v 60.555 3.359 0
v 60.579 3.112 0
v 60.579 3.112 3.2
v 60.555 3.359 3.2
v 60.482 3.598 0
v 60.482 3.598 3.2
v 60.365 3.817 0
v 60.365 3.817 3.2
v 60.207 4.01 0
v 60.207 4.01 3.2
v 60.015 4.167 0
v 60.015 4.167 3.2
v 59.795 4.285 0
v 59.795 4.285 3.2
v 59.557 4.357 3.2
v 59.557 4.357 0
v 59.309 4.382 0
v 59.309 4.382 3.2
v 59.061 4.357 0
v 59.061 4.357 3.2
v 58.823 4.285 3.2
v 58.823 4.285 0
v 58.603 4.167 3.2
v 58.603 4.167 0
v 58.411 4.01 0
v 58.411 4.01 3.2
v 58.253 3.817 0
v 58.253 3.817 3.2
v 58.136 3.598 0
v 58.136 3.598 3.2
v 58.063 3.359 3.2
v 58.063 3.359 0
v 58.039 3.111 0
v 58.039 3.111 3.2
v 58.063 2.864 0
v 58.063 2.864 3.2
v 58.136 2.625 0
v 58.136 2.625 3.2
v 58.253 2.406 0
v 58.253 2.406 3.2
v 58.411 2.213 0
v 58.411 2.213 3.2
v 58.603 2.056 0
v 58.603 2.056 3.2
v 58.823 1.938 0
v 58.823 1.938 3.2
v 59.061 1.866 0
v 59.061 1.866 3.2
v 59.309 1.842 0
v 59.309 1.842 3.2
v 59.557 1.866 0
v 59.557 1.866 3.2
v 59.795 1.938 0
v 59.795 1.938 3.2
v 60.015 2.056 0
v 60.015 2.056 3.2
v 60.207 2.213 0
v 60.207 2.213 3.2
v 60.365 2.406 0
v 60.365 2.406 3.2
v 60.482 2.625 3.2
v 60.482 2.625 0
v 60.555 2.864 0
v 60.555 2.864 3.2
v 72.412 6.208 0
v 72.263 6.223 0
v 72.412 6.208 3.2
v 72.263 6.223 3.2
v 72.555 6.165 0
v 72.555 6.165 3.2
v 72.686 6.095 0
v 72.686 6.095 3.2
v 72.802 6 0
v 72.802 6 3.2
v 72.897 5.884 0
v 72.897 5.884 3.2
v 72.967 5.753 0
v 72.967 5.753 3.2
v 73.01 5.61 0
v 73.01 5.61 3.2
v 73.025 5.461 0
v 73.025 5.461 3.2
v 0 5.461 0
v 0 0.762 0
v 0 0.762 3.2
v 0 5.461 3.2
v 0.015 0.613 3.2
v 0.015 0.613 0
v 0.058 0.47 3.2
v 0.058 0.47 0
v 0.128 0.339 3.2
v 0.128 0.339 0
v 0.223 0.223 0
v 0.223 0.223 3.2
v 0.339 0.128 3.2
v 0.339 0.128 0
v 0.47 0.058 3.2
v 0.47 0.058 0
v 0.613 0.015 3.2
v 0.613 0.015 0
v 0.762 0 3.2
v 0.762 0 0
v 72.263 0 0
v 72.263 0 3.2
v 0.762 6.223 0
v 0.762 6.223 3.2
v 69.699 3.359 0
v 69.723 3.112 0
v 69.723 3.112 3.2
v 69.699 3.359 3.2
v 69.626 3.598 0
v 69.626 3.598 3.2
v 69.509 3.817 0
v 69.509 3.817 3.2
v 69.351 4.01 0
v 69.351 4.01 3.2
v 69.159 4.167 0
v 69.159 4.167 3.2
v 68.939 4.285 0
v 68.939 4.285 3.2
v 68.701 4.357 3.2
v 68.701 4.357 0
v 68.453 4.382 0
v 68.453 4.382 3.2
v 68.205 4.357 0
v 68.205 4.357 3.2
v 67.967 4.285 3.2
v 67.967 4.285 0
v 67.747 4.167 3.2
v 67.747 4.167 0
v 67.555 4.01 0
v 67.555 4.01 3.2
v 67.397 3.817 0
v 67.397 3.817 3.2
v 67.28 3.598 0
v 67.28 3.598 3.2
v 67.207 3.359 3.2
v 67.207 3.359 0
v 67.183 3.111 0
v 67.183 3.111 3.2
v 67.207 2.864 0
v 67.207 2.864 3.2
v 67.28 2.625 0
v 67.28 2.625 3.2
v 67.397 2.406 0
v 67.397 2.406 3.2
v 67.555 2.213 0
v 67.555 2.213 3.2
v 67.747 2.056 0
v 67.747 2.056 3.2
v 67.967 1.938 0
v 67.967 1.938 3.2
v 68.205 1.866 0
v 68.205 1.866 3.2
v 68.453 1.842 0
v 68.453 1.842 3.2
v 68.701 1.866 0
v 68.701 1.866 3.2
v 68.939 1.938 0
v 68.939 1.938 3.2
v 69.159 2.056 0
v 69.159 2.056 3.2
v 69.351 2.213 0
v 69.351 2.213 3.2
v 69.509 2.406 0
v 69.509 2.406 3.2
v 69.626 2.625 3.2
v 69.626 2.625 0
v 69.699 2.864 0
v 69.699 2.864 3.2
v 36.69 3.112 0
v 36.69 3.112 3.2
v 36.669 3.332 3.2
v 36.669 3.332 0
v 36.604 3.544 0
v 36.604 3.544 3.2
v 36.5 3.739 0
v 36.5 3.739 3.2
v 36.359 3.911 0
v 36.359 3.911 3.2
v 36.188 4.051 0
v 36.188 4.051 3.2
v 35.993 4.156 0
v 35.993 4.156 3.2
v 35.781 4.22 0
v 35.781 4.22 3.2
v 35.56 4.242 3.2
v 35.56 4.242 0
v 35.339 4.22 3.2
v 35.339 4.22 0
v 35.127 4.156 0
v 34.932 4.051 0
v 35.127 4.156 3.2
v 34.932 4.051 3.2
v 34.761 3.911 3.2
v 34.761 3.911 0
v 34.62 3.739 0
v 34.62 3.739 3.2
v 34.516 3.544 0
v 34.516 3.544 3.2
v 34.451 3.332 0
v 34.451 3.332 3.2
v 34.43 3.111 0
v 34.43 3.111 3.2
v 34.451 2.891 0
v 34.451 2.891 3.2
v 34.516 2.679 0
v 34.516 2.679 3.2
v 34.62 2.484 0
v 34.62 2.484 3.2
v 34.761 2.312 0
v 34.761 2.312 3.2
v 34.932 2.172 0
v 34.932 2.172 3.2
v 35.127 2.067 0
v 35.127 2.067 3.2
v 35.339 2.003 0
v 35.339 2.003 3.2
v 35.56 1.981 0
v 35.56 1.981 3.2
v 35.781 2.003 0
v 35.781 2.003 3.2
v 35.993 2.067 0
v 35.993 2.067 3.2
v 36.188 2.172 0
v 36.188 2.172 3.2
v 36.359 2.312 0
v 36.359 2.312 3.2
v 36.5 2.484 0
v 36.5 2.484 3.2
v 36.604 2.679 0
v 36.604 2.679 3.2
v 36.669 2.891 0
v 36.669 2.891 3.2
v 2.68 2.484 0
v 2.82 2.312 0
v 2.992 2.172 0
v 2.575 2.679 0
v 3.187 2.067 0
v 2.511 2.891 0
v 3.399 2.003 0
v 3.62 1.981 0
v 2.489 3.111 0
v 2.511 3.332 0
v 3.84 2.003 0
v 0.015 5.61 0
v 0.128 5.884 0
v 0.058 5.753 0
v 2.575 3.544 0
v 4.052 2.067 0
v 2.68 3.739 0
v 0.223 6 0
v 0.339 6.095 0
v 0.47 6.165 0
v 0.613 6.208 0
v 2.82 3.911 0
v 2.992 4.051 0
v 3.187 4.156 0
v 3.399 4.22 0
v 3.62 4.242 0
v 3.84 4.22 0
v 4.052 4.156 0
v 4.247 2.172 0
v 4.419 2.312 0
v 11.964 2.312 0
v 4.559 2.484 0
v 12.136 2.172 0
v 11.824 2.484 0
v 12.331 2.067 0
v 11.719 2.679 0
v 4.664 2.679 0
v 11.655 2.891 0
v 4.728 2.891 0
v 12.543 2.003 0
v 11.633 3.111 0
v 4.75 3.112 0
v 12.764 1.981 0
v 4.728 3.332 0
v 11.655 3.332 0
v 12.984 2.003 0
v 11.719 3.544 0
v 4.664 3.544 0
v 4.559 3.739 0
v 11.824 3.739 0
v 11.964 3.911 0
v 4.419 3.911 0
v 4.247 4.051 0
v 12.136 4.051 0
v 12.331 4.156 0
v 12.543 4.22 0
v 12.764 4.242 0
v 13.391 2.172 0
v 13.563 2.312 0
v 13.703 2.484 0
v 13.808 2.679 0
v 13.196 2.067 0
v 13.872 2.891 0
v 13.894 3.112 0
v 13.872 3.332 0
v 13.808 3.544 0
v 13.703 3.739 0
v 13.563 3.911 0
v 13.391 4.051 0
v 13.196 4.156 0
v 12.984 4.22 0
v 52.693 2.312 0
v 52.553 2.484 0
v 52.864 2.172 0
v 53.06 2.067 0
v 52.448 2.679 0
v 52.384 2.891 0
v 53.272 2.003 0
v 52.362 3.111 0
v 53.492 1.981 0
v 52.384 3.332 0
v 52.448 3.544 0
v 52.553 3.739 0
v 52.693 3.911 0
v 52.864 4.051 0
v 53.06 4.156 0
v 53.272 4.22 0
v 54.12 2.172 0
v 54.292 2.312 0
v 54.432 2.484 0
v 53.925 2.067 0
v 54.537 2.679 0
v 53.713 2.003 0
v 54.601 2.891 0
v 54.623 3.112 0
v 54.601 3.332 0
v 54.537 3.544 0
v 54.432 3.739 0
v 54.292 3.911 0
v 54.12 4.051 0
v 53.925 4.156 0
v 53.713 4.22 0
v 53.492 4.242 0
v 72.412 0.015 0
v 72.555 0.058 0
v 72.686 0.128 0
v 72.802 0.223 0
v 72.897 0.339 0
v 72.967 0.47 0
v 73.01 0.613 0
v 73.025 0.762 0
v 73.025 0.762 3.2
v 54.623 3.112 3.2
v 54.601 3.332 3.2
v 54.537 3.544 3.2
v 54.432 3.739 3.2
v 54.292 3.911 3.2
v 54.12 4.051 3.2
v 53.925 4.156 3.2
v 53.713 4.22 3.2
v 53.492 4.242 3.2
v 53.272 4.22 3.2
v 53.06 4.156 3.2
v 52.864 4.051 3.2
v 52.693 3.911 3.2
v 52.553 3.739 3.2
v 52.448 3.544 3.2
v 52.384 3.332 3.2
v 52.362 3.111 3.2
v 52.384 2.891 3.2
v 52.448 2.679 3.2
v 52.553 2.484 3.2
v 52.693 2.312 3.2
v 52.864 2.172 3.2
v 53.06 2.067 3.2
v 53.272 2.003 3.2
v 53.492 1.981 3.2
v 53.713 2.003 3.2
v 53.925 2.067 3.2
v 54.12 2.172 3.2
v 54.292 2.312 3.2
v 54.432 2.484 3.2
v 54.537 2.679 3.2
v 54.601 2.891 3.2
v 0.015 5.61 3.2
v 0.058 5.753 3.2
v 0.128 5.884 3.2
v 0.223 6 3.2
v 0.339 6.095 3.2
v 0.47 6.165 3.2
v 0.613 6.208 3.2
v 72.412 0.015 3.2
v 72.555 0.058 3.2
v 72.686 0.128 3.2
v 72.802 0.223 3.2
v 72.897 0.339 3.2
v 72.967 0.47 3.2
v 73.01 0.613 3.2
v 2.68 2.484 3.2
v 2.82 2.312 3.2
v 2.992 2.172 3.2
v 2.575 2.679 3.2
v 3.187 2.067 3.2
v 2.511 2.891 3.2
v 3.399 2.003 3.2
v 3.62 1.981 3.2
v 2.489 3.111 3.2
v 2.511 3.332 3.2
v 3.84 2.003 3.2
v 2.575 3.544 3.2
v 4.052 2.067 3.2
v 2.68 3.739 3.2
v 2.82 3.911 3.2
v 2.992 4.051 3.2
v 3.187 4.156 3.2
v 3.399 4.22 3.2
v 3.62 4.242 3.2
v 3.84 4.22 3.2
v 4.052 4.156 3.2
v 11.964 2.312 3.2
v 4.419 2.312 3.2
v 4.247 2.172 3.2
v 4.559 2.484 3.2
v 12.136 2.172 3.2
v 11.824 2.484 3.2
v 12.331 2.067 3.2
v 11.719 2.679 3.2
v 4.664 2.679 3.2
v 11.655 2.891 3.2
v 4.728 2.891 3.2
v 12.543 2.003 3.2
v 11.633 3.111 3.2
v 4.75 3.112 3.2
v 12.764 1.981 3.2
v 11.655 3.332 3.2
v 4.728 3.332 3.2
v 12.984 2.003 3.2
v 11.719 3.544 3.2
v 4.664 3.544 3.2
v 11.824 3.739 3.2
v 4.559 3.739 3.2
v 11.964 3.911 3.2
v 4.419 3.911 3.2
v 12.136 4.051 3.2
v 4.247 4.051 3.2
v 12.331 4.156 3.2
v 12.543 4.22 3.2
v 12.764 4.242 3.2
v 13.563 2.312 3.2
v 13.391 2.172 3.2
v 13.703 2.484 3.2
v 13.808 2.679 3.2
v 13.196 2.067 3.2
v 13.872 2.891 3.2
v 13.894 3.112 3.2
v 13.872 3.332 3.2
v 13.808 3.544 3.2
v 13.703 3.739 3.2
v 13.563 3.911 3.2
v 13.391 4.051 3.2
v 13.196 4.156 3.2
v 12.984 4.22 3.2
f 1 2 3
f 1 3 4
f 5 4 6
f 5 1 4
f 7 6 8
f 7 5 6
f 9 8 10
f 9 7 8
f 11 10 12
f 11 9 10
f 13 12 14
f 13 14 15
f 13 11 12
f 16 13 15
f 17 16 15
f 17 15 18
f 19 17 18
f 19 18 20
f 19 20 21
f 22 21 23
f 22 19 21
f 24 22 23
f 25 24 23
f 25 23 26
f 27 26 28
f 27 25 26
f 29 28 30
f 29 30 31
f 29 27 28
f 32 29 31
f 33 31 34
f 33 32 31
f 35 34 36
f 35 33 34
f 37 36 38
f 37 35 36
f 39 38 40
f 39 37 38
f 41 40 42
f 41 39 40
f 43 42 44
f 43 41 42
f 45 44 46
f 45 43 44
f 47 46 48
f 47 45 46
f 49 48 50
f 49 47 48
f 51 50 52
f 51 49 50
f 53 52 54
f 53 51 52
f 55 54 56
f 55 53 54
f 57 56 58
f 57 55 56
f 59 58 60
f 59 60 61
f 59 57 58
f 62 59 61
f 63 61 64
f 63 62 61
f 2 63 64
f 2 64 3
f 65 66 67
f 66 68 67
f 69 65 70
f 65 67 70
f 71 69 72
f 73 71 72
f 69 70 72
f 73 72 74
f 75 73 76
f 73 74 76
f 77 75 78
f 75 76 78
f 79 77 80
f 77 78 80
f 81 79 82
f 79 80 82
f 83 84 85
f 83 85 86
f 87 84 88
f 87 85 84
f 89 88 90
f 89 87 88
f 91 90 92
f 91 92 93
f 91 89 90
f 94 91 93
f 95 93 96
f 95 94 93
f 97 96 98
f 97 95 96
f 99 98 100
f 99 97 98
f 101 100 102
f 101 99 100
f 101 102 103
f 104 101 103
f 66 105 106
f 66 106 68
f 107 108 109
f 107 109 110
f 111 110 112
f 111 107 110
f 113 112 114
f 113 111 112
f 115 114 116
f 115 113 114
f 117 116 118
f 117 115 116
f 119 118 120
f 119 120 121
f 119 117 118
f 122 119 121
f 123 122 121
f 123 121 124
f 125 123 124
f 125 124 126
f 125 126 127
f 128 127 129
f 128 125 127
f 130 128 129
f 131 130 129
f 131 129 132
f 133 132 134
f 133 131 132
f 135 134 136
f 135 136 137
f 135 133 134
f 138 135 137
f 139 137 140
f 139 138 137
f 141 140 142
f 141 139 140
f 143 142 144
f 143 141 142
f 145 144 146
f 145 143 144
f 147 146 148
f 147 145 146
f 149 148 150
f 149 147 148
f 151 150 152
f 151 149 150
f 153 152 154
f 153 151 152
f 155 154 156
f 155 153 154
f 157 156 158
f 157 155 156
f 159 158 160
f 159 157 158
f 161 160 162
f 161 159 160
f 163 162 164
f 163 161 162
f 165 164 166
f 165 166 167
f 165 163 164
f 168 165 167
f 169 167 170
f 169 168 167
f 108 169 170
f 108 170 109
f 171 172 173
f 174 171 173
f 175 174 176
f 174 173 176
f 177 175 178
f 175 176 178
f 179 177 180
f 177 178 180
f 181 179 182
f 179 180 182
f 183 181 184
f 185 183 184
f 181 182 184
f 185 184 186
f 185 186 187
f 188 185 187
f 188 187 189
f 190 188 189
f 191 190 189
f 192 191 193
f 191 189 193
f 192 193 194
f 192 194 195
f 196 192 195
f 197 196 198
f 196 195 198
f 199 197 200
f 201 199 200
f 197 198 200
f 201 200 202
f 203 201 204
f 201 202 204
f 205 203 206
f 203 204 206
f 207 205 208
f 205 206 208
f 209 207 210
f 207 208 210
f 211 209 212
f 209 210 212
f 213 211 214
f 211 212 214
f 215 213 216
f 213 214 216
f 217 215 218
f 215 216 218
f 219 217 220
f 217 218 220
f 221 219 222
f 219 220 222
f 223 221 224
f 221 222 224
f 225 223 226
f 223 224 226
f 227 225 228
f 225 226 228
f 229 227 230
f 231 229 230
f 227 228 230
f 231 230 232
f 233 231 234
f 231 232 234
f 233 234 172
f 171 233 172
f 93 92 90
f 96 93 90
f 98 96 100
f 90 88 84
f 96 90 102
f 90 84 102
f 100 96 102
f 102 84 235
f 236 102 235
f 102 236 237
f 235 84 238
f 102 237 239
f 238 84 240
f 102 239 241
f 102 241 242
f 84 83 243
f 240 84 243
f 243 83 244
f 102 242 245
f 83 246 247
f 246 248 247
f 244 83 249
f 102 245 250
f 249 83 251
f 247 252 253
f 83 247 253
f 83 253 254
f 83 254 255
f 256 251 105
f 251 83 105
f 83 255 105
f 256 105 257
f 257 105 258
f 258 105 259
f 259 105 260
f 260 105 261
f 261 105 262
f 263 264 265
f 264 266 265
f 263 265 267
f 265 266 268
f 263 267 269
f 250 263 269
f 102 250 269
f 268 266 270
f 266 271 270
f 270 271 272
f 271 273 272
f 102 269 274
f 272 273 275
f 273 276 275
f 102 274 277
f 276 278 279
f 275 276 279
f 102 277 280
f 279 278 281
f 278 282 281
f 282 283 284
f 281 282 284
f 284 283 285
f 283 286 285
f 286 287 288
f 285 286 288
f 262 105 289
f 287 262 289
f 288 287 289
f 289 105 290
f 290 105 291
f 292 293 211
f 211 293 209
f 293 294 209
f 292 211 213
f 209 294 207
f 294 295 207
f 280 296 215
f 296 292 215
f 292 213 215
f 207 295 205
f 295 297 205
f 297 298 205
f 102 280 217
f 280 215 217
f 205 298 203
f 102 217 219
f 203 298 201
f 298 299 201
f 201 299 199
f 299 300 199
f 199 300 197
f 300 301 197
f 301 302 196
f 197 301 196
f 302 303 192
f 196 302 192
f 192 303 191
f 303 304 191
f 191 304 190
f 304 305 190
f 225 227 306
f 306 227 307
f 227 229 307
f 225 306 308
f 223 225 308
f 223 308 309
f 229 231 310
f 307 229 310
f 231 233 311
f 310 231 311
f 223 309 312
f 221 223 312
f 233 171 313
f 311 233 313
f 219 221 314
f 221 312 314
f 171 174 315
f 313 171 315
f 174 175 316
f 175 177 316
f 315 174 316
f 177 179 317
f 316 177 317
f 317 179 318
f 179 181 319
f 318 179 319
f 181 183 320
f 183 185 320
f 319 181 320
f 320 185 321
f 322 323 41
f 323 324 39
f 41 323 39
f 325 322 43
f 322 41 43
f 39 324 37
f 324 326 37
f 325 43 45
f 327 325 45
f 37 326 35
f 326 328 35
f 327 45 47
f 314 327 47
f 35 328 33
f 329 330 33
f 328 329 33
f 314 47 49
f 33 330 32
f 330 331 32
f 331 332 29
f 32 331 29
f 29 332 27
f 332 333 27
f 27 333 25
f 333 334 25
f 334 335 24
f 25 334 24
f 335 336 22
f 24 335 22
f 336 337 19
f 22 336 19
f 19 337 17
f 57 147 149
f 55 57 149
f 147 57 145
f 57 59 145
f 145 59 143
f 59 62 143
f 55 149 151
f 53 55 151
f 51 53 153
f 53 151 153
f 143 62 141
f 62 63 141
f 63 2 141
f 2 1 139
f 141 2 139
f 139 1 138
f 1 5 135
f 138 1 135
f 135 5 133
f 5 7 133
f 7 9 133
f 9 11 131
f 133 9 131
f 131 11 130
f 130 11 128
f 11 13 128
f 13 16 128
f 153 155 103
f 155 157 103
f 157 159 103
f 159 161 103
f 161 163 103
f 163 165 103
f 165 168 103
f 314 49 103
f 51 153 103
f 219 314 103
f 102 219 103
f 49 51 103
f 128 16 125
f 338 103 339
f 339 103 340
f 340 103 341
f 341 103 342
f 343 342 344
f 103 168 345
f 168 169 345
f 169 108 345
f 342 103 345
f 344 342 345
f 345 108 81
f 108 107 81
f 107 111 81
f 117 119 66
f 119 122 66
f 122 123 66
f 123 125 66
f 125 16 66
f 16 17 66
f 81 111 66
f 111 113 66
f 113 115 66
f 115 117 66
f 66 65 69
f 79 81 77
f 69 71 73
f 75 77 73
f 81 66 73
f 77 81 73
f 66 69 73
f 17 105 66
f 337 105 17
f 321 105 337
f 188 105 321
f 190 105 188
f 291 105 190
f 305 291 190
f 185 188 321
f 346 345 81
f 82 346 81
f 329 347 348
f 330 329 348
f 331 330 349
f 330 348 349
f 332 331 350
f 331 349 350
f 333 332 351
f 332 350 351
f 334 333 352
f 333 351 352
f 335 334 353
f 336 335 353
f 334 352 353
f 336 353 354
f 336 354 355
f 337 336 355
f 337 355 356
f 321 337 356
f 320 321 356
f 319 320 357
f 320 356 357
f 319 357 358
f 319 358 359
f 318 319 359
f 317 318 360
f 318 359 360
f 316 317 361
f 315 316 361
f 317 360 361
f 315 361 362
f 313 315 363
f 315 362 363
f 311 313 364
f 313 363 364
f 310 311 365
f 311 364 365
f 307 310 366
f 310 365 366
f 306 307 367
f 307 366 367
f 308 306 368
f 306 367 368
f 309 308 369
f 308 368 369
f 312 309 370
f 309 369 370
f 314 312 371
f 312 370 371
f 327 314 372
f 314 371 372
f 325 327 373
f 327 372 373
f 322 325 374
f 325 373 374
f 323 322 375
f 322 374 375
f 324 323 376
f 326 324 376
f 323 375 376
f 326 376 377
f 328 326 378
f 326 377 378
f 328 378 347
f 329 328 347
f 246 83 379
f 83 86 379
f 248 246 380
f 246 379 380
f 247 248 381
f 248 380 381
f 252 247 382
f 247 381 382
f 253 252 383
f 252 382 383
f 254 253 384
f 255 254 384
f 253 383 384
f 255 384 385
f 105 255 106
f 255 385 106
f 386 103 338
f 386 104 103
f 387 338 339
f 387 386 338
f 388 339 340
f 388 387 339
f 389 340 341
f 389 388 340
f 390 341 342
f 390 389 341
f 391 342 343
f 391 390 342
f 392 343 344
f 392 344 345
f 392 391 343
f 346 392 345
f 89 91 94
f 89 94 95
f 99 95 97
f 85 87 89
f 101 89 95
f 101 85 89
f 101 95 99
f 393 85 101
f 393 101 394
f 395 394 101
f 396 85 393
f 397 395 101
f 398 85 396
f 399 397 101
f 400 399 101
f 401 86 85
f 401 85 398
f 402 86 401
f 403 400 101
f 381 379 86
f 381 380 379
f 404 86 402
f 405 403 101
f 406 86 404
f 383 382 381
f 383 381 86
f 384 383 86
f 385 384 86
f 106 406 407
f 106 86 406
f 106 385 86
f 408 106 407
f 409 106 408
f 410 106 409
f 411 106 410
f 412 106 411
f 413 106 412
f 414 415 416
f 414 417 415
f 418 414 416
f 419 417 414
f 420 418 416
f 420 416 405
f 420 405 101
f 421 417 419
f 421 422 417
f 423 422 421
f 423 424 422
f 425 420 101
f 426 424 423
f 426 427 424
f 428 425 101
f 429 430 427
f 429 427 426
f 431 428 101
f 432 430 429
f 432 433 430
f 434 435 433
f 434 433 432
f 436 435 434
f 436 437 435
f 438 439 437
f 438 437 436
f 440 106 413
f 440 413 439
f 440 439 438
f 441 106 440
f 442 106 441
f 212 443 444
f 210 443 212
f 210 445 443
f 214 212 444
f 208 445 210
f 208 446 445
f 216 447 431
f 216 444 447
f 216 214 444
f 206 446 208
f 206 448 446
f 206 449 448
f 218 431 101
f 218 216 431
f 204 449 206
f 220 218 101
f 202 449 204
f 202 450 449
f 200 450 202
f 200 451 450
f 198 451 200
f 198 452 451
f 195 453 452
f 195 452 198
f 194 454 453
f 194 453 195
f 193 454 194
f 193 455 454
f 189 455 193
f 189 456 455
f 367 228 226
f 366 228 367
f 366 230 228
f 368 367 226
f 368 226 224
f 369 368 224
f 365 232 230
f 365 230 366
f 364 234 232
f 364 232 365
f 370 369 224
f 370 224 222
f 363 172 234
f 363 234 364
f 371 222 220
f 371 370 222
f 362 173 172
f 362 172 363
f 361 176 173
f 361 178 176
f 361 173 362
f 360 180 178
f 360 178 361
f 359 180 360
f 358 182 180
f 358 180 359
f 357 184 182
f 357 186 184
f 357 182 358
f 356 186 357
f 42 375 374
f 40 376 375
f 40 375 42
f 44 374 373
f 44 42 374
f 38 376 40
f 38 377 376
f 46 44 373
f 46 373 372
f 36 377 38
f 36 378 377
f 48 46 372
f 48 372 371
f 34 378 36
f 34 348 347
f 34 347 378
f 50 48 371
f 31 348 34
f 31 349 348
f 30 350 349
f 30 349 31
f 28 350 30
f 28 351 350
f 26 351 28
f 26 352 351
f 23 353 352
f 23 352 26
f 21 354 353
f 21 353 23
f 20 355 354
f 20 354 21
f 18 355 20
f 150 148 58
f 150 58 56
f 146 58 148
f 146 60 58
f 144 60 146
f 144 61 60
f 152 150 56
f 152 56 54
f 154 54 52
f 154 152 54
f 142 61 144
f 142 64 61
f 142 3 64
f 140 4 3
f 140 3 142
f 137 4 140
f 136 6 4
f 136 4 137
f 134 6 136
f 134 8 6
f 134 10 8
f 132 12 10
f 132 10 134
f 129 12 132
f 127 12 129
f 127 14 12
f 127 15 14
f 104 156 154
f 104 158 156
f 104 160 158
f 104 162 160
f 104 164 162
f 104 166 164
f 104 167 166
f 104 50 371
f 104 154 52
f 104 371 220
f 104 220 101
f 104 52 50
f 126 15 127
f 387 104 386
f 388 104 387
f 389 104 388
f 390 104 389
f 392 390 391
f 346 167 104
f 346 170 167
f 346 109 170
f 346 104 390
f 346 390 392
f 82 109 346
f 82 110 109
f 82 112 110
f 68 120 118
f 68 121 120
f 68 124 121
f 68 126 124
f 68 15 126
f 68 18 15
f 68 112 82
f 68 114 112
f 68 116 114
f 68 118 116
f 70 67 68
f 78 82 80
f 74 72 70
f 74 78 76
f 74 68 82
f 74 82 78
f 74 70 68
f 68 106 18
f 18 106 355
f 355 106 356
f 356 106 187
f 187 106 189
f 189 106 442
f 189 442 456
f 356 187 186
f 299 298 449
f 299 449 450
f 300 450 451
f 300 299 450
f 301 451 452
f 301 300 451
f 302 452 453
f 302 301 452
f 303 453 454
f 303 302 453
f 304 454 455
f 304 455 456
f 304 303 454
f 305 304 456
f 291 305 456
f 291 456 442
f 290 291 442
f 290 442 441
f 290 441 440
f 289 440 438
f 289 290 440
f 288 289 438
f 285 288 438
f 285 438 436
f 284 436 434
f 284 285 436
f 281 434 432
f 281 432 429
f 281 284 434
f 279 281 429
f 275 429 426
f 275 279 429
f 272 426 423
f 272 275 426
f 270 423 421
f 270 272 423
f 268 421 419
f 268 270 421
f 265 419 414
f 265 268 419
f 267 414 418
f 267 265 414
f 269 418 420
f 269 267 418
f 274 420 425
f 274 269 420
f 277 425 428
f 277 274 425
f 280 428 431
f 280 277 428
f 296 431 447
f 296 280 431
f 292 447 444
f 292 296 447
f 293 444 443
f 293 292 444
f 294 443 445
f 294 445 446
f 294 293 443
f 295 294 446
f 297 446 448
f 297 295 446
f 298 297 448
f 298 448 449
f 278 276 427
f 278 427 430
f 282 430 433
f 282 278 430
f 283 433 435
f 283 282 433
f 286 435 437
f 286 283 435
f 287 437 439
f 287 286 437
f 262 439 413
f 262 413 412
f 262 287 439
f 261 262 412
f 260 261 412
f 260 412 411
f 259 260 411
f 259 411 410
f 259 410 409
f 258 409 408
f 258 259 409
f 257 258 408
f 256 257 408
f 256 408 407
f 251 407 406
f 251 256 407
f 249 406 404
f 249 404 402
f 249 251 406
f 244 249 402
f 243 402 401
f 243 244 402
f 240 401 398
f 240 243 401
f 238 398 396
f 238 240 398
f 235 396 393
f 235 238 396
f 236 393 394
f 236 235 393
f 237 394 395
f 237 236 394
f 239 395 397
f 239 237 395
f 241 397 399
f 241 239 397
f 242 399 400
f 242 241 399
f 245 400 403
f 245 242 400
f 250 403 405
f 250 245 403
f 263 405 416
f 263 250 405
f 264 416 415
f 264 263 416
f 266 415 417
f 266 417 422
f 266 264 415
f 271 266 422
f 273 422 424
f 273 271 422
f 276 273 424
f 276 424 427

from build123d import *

# Parameters (mm, degrees)
SKETCH1_W           = 73.025
SKETCH1_H           = 6.223
SKETCH1_R           = 1.27
SKETCH1_R_2         = 1.1303
BOSS_EXTRUDE1_DEPTH = 3.2004
SKETCH2_R           = 1.1303
CUT_EXTRUDE1_DEPTH  = 3.2004
FILLET1_R           = 0.762


with BuildPart() as part:
    # Sketch1 → Boss-Extrude1 (new body)
    with BuildSketch(Plane.XY):
        with Locations((36.5125, 3.1115)):
            Rectangle(SKETCH1_W, SKETCH1_H)
        with Locations((59.309, 3.1115)):
            Circle(SKETCH1_R, mode=Mode.SUBTRACT)
        with Locations((68.453, 3.1115)):
            Circle(SKETCH1_R, mode=Mode.SUBTRACT)
        with Locations((3.6195, 3.1115)):
            Circle(SKETCH1_R_2, mode=Mode.SUBTRACT)
        with Locations((12.7635, 3.1115)):
            Circle(SKETCH1_R_2, mode=Mode.SUBTRACT)
    extrude(amount=BOSS_EXTRUDE1_DEPTH)

    # Sketch2 → Cut-Extrude1 (cut)
    with BuildSketch(Plane.XY.offset(3.2004)):
        with Locations((35.56, 3.1115)):
            Circle(SKETCH2_R)
        with Locations((53.4924, 3.1115)):
            Circle(SKETCH2_R)
    extrude(amount=-CUT_EXTRUDE1_DEPTH, mode=Mode.SUBTRACT)

    # Fillet1
    fillet1_edges = [part.edges().sort_by_distance(p)[0] for p in [
        (0, 6.223, 1.6002),
        (73.025, 6.223, 1.6002),
        (73.025, 0, 1.6002),
        (0, 0, 1.6002),
    ]]
    fillet(fillet1_edges, radius=FILLET1_R)


solid = part.part
